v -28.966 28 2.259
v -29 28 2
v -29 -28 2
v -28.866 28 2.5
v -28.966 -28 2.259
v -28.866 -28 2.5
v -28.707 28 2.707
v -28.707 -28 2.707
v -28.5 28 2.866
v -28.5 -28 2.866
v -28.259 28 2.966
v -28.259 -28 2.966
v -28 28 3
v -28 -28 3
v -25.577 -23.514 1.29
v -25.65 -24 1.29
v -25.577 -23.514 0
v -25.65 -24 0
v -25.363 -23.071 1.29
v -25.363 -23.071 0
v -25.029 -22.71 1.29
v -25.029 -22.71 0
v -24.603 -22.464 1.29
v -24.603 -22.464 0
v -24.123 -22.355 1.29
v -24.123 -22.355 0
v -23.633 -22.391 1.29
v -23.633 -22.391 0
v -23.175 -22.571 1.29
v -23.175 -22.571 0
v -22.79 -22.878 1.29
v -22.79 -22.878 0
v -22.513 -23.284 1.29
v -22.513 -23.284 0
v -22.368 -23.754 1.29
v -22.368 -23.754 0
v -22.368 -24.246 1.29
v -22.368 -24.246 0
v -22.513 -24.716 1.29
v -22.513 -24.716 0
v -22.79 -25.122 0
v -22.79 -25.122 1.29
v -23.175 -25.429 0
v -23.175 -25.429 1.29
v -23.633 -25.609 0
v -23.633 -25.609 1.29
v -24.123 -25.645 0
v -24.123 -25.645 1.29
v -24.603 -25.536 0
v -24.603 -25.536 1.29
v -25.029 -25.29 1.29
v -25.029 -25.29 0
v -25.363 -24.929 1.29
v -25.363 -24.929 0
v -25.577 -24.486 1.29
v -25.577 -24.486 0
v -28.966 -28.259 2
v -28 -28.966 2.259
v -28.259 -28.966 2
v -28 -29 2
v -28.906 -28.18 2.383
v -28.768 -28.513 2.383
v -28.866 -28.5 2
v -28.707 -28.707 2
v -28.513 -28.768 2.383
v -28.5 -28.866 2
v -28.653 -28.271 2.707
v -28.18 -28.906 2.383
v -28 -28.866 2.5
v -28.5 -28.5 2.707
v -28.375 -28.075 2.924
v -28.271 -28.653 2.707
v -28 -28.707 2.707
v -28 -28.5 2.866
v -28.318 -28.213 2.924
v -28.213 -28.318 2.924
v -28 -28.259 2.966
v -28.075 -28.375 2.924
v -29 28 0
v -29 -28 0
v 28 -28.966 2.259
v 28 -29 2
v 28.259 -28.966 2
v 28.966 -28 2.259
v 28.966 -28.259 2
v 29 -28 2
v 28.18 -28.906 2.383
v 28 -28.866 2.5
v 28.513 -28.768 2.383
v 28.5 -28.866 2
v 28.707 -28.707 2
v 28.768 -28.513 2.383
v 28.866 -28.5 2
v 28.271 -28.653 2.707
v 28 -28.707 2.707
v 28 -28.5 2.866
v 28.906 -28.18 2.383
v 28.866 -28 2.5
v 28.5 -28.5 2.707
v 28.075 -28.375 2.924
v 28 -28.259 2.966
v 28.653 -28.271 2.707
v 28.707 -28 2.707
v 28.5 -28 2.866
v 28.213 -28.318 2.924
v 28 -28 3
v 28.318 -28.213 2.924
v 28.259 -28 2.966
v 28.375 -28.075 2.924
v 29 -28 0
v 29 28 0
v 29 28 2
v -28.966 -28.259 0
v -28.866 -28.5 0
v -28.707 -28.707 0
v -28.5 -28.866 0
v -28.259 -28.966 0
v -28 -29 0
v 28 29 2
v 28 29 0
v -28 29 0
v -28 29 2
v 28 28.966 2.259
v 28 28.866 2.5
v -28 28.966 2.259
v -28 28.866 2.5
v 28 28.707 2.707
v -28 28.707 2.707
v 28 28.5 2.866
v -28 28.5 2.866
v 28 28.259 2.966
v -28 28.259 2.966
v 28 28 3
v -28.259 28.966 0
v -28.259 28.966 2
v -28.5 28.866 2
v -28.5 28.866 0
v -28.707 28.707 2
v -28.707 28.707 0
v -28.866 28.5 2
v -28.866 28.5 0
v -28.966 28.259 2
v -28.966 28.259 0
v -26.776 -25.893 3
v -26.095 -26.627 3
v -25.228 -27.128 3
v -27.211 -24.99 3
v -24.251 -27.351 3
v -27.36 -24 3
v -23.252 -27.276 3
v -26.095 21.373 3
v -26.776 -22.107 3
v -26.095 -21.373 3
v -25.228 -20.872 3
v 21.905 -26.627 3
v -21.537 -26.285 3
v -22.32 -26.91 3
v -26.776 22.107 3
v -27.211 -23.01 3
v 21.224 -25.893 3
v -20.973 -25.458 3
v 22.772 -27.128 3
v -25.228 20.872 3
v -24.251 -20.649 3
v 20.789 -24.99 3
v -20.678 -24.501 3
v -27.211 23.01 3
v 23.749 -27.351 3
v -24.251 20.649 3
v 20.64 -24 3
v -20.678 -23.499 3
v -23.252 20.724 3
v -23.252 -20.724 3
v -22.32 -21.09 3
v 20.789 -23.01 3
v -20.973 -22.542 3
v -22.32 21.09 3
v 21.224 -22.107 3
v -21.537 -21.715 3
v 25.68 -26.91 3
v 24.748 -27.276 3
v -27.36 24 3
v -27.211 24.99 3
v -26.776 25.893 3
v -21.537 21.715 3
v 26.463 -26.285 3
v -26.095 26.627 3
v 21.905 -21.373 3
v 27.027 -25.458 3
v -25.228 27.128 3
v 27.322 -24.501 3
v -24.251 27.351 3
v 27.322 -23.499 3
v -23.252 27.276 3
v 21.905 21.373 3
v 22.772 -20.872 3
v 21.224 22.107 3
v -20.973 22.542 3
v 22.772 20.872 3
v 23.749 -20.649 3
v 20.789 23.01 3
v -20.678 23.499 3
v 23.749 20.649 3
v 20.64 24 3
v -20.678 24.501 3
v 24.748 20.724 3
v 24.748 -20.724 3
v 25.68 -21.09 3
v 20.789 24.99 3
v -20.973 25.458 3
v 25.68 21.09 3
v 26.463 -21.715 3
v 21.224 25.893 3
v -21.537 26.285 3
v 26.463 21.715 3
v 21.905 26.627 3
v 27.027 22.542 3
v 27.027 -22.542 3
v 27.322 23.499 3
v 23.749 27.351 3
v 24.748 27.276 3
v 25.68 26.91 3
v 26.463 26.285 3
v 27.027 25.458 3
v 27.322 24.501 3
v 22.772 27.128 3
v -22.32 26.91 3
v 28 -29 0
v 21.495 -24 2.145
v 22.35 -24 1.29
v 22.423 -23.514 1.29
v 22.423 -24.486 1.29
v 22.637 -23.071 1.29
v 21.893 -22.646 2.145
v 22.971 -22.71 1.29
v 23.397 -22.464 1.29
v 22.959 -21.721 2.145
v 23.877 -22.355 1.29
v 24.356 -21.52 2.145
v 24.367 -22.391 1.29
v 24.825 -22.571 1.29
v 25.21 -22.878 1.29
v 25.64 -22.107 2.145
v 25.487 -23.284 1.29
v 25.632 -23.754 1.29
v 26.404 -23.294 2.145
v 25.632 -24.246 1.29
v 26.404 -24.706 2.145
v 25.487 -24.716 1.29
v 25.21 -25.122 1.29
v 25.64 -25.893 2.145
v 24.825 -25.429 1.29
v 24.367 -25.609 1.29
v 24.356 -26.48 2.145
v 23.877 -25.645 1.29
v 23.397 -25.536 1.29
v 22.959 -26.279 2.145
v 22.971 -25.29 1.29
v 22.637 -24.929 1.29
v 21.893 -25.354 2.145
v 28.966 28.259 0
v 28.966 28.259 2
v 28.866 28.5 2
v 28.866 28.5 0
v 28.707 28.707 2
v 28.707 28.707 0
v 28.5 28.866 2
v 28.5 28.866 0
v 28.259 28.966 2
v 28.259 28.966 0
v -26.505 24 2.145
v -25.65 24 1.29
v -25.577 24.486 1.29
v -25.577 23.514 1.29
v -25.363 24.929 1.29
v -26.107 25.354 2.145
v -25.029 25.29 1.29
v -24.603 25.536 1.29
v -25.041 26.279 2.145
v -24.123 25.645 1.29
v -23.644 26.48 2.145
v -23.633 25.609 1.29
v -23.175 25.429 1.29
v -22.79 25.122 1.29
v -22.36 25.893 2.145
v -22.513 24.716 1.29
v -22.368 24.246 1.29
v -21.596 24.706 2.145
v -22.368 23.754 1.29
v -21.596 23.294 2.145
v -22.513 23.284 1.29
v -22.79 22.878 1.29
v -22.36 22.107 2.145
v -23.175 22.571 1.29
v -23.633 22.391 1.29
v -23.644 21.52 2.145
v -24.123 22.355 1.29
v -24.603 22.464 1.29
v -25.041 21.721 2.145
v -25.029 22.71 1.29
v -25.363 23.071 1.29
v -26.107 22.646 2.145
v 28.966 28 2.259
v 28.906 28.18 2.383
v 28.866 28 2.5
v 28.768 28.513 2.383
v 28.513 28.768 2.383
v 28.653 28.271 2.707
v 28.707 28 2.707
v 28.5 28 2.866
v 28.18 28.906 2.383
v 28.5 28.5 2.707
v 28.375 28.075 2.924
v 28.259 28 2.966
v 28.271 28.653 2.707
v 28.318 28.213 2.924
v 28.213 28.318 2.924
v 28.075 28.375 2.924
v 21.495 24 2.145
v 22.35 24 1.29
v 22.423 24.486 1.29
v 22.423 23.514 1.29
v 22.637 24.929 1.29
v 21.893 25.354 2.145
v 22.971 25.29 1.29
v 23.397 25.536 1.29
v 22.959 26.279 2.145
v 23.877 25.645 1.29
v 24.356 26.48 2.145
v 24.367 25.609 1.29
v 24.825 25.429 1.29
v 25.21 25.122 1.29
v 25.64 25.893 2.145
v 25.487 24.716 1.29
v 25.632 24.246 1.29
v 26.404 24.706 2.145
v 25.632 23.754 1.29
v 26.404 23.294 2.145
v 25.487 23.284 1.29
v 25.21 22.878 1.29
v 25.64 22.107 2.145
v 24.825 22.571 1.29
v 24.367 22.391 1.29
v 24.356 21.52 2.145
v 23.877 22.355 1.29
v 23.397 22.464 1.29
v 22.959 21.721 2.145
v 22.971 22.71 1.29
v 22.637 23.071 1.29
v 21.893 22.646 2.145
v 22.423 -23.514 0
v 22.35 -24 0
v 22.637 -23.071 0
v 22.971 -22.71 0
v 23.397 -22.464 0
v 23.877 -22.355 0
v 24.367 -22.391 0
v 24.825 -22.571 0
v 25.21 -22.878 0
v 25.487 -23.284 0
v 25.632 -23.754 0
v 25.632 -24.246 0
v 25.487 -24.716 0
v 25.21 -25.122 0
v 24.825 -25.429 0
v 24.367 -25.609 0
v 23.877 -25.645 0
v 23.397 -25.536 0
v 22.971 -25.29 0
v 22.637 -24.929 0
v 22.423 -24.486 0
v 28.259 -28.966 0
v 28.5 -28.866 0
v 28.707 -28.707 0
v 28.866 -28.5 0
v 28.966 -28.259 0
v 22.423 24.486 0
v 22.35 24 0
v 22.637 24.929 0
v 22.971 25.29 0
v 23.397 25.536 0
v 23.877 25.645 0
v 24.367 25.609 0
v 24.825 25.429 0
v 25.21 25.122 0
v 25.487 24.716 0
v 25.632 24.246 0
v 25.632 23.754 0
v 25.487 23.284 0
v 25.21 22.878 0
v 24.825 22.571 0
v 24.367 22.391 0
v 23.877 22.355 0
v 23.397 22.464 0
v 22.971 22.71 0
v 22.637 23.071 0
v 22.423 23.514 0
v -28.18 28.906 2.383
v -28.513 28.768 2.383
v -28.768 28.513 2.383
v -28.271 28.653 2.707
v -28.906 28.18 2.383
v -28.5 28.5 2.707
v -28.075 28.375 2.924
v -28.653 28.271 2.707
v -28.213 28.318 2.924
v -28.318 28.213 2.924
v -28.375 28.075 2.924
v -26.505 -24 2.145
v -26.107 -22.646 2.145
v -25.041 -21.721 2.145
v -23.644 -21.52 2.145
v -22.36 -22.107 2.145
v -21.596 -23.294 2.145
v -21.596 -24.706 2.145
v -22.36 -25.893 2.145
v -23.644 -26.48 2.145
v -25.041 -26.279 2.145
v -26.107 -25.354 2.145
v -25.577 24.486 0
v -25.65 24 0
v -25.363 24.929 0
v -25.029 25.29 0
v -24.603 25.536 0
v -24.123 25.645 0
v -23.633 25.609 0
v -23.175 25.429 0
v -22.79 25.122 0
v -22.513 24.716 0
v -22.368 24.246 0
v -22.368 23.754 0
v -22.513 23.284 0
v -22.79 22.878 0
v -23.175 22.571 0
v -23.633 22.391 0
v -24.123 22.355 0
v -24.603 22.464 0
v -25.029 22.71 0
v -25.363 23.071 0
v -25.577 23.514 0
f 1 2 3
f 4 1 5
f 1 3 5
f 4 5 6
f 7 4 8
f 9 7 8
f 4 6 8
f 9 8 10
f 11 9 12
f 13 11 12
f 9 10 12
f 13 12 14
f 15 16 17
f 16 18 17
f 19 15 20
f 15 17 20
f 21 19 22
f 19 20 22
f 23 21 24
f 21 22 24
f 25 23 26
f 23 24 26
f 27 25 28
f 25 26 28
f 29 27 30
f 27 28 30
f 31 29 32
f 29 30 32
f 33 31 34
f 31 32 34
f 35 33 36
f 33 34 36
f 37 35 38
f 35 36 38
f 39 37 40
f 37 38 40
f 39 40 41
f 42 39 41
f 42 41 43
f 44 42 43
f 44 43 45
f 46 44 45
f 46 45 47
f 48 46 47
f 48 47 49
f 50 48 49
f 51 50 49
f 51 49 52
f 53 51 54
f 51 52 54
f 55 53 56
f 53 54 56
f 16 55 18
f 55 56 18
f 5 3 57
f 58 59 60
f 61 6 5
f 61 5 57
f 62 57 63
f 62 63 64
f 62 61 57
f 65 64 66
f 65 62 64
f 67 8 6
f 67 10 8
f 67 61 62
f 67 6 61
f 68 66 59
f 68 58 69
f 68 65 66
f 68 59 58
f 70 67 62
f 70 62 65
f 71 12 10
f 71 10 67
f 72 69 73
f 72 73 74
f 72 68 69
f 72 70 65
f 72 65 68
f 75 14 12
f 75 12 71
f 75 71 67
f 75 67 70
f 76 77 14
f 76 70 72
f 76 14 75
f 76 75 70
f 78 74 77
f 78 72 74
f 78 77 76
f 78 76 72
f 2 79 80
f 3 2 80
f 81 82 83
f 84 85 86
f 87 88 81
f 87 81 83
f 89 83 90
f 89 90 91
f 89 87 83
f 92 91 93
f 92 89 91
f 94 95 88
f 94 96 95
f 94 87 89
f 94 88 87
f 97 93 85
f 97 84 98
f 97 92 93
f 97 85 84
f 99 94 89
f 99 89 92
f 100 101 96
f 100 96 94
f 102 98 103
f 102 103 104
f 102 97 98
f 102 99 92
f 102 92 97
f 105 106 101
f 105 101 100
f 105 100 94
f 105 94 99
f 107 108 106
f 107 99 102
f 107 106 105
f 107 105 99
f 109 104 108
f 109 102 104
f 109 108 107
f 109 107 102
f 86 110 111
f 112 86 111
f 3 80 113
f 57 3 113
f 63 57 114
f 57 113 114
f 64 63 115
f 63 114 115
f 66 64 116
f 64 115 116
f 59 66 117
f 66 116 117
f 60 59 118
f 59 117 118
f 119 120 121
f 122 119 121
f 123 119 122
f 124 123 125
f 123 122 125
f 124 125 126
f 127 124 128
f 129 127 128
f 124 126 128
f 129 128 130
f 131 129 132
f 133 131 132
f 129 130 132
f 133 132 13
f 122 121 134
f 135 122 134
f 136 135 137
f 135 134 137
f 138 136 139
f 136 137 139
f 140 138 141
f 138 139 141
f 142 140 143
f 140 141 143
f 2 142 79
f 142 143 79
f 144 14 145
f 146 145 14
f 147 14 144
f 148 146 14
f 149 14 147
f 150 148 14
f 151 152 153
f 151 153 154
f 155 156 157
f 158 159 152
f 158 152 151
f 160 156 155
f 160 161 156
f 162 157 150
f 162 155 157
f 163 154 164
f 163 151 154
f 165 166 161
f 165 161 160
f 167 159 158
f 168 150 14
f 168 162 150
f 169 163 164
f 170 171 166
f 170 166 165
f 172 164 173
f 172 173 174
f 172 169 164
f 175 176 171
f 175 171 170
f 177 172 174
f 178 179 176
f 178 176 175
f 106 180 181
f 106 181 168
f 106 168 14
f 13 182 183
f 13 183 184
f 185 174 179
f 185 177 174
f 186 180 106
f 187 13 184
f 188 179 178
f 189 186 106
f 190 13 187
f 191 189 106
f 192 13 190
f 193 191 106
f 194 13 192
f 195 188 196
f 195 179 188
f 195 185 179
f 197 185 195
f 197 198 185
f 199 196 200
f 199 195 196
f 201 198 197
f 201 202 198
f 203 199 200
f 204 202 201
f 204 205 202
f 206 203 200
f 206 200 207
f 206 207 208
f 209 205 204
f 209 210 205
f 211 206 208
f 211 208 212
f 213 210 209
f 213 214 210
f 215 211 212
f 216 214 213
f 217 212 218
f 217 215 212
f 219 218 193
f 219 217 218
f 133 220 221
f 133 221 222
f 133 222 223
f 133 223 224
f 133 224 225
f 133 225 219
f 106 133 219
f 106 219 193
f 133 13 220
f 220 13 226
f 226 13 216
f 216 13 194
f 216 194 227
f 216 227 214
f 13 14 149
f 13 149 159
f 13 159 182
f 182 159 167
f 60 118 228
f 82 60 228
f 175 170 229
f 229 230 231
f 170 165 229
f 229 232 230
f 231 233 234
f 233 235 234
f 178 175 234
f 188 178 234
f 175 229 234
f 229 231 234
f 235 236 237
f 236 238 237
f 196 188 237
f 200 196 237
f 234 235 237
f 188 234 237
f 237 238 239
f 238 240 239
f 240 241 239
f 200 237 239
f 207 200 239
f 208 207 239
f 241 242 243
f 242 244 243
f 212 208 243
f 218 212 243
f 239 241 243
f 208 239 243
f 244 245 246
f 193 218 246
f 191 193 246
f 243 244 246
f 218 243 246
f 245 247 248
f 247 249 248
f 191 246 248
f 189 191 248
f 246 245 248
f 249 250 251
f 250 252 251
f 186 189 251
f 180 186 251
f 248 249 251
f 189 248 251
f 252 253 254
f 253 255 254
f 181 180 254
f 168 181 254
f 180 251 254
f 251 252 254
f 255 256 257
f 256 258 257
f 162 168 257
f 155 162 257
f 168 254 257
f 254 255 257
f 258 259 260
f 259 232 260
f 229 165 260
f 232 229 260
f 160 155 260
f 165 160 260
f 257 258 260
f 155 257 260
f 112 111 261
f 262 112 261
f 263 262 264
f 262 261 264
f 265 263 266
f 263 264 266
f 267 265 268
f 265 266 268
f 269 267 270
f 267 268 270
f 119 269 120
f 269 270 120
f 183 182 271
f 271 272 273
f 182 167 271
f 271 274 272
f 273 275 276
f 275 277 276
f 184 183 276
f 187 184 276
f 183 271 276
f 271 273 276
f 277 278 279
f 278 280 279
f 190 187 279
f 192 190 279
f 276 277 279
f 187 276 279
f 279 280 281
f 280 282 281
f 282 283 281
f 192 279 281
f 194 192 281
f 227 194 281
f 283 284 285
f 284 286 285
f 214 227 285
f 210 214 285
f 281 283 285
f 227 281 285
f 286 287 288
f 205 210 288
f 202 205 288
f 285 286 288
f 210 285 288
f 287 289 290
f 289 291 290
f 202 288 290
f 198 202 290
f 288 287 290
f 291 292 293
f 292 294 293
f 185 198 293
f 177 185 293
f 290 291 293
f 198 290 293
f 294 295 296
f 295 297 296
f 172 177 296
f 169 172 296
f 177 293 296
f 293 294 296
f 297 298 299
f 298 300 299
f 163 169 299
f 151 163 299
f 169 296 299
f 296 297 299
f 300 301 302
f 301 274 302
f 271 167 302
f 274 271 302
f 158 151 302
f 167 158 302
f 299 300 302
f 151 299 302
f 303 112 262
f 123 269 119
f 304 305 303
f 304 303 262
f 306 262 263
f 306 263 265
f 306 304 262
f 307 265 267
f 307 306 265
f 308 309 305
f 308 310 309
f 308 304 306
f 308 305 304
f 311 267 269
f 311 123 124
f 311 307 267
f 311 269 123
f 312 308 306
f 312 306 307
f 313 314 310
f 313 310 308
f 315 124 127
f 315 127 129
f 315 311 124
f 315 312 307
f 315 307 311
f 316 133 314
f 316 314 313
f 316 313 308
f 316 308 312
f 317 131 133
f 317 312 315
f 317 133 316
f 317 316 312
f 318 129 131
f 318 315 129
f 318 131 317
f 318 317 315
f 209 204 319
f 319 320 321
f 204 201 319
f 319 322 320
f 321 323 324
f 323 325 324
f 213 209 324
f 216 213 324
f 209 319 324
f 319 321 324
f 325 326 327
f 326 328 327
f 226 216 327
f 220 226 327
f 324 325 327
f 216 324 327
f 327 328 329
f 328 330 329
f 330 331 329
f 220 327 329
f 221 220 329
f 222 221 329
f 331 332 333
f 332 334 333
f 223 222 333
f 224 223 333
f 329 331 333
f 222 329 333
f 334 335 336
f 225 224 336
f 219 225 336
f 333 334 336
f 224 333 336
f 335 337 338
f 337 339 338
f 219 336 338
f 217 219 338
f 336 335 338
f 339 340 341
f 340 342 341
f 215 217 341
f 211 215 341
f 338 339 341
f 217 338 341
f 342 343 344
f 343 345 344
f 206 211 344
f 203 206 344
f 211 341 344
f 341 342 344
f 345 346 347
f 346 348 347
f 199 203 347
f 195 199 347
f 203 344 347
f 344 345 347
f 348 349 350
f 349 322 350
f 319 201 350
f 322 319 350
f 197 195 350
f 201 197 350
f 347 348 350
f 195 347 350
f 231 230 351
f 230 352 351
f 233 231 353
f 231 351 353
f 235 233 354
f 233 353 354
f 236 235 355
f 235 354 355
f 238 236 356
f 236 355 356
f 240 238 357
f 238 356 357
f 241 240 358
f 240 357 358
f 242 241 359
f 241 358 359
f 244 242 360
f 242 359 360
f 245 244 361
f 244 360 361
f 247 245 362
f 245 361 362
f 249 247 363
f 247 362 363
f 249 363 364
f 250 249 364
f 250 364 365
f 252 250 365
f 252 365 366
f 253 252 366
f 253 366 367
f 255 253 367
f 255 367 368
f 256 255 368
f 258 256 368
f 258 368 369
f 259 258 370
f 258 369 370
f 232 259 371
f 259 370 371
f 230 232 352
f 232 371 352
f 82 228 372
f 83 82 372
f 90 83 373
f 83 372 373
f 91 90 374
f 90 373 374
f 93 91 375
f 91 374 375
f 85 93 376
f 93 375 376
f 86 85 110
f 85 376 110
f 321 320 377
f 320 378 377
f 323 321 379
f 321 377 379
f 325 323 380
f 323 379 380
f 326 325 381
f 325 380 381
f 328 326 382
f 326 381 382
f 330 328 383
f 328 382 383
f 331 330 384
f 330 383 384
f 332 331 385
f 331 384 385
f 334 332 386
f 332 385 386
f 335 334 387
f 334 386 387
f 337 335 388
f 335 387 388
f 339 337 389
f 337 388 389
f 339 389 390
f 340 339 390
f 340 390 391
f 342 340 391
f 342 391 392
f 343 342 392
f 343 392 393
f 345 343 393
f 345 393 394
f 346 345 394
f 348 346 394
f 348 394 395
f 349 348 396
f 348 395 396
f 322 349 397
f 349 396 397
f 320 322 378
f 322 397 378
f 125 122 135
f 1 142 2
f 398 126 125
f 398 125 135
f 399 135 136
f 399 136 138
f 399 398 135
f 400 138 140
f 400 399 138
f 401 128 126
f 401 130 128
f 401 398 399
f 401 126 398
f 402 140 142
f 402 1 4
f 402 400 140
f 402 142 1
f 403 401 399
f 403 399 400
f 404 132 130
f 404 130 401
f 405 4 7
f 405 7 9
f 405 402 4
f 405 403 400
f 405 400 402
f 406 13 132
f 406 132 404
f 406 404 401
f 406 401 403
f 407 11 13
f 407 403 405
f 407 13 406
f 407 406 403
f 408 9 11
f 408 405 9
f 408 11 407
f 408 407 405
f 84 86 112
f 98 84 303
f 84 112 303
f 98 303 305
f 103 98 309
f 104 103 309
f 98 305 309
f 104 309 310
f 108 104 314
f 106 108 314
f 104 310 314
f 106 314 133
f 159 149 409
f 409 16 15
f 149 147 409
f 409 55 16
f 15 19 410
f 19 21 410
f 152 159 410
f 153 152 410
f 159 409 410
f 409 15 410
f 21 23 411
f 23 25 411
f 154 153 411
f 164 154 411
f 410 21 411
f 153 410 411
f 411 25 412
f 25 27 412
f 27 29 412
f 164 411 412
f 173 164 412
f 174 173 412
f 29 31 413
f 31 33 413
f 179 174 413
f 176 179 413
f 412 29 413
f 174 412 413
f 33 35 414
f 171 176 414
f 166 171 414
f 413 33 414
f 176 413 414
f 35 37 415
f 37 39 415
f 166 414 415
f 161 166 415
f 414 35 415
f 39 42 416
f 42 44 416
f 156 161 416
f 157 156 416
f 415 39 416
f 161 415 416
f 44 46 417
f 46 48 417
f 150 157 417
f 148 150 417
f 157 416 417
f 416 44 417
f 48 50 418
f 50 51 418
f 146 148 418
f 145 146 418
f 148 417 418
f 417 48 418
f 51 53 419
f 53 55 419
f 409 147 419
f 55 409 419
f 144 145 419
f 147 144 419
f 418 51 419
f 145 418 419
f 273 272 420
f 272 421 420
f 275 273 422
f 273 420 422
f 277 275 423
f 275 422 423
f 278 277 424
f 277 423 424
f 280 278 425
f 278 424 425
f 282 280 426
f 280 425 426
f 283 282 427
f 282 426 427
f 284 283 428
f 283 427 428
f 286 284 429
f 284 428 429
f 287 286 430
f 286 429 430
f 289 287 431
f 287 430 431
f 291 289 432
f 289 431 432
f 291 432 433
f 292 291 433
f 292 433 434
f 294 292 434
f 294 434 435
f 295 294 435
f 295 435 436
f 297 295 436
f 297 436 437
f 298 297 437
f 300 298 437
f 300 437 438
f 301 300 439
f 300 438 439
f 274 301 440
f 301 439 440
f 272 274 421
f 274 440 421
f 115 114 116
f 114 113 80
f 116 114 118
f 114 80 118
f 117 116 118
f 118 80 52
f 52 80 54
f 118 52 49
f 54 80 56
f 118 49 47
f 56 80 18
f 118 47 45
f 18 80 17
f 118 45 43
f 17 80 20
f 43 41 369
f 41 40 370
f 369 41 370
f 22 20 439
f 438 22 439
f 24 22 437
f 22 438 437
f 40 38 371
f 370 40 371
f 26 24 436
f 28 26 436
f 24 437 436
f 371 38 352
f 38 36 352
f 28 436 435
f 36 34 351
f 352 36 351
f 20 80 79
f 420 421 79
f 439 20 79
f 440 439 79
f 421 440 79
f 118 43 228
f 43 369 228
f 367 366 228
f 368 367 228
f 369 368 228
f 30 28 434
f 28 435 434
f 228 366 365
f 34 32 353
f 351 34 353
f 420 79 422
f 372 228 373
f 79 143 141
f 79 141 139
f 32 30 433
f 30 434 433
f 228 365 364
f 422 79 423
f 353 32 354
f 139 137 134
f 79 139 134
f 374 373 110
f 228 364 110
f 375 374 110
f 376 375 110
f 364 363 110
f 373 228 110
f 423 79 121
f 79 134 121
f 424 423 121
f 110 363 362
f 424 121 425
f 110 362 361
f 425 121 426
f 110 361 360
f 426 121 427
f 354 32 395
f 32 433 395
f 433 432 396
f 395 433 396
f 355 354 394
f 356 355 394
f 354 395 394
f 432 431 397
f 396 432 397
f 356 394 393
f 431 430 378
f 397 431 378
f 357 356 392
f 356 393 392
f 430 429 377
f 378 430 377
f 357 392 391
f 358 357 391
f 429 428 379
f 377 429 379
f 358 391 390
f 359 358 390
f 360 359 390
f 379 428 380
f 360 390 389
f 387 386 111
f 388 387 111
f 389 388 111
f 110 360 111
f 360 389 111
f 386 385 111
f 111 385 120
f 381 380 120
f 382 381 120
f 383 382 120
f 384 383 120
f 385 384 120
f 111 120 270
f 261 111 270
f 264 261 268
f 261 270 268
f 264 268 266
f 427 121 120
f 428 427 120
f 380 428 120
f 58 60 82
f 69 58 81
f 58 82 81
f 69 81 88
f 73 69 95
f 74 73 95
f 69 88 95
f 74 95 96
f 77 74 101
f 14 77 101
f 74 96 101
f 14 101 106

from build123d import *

# Parameters (mm, degrees)
F1_DEPTH       = 3
F2_R           = 1
F4_D           = 3.3
F4_CSINK_D     = 6.72
F4_CSINK_ANGLE = 90


with BuildPart() as f1:
    # F0 (on Top) → F1 (new body)
    with BuildSketch(Plane.XY):
        with BuildLine():
            Line((-28, -29), (28, -29))
            ThreePointArc((28, -29), (28.7071067812, -28.7071067812), (29, -28))
            Line((29, -28), (29, 28))
            ThreePointArc((29, 28), (28.7071067812, 28.7071067812), (28, 29))
            Line((28, 29), (-28, 29))
            ThreePointArc((-28, 29), (-28.7071067812, 28.7071067812), (-29, 28))
            Line((-29, 28), (-29, -28))
            ThreePointArc((-29, -28), (-28.7071067812, -28.7071067812), (-28, -29))
        make_face()
    extrude(amount=F1_DEPTH)

    # F2
    f2_edges = [f1.edges().sort_by_distance(p)[0] for p in [
        (29, 0, 3),
    ]]
    fillet(f2_edges, radius=F2_R)

    # F4 (through all)
    with Locations(Plane.XY.offset(3)):
        with Locations((-24, 24), (24, 24), (-24, -24), (24, -24)):
            CounterSinkHole(F4_D / 2, F4_CSINK_D / 2, counter_sink_angle=F4_CSINK_ANGLE)


solid = f1.part
